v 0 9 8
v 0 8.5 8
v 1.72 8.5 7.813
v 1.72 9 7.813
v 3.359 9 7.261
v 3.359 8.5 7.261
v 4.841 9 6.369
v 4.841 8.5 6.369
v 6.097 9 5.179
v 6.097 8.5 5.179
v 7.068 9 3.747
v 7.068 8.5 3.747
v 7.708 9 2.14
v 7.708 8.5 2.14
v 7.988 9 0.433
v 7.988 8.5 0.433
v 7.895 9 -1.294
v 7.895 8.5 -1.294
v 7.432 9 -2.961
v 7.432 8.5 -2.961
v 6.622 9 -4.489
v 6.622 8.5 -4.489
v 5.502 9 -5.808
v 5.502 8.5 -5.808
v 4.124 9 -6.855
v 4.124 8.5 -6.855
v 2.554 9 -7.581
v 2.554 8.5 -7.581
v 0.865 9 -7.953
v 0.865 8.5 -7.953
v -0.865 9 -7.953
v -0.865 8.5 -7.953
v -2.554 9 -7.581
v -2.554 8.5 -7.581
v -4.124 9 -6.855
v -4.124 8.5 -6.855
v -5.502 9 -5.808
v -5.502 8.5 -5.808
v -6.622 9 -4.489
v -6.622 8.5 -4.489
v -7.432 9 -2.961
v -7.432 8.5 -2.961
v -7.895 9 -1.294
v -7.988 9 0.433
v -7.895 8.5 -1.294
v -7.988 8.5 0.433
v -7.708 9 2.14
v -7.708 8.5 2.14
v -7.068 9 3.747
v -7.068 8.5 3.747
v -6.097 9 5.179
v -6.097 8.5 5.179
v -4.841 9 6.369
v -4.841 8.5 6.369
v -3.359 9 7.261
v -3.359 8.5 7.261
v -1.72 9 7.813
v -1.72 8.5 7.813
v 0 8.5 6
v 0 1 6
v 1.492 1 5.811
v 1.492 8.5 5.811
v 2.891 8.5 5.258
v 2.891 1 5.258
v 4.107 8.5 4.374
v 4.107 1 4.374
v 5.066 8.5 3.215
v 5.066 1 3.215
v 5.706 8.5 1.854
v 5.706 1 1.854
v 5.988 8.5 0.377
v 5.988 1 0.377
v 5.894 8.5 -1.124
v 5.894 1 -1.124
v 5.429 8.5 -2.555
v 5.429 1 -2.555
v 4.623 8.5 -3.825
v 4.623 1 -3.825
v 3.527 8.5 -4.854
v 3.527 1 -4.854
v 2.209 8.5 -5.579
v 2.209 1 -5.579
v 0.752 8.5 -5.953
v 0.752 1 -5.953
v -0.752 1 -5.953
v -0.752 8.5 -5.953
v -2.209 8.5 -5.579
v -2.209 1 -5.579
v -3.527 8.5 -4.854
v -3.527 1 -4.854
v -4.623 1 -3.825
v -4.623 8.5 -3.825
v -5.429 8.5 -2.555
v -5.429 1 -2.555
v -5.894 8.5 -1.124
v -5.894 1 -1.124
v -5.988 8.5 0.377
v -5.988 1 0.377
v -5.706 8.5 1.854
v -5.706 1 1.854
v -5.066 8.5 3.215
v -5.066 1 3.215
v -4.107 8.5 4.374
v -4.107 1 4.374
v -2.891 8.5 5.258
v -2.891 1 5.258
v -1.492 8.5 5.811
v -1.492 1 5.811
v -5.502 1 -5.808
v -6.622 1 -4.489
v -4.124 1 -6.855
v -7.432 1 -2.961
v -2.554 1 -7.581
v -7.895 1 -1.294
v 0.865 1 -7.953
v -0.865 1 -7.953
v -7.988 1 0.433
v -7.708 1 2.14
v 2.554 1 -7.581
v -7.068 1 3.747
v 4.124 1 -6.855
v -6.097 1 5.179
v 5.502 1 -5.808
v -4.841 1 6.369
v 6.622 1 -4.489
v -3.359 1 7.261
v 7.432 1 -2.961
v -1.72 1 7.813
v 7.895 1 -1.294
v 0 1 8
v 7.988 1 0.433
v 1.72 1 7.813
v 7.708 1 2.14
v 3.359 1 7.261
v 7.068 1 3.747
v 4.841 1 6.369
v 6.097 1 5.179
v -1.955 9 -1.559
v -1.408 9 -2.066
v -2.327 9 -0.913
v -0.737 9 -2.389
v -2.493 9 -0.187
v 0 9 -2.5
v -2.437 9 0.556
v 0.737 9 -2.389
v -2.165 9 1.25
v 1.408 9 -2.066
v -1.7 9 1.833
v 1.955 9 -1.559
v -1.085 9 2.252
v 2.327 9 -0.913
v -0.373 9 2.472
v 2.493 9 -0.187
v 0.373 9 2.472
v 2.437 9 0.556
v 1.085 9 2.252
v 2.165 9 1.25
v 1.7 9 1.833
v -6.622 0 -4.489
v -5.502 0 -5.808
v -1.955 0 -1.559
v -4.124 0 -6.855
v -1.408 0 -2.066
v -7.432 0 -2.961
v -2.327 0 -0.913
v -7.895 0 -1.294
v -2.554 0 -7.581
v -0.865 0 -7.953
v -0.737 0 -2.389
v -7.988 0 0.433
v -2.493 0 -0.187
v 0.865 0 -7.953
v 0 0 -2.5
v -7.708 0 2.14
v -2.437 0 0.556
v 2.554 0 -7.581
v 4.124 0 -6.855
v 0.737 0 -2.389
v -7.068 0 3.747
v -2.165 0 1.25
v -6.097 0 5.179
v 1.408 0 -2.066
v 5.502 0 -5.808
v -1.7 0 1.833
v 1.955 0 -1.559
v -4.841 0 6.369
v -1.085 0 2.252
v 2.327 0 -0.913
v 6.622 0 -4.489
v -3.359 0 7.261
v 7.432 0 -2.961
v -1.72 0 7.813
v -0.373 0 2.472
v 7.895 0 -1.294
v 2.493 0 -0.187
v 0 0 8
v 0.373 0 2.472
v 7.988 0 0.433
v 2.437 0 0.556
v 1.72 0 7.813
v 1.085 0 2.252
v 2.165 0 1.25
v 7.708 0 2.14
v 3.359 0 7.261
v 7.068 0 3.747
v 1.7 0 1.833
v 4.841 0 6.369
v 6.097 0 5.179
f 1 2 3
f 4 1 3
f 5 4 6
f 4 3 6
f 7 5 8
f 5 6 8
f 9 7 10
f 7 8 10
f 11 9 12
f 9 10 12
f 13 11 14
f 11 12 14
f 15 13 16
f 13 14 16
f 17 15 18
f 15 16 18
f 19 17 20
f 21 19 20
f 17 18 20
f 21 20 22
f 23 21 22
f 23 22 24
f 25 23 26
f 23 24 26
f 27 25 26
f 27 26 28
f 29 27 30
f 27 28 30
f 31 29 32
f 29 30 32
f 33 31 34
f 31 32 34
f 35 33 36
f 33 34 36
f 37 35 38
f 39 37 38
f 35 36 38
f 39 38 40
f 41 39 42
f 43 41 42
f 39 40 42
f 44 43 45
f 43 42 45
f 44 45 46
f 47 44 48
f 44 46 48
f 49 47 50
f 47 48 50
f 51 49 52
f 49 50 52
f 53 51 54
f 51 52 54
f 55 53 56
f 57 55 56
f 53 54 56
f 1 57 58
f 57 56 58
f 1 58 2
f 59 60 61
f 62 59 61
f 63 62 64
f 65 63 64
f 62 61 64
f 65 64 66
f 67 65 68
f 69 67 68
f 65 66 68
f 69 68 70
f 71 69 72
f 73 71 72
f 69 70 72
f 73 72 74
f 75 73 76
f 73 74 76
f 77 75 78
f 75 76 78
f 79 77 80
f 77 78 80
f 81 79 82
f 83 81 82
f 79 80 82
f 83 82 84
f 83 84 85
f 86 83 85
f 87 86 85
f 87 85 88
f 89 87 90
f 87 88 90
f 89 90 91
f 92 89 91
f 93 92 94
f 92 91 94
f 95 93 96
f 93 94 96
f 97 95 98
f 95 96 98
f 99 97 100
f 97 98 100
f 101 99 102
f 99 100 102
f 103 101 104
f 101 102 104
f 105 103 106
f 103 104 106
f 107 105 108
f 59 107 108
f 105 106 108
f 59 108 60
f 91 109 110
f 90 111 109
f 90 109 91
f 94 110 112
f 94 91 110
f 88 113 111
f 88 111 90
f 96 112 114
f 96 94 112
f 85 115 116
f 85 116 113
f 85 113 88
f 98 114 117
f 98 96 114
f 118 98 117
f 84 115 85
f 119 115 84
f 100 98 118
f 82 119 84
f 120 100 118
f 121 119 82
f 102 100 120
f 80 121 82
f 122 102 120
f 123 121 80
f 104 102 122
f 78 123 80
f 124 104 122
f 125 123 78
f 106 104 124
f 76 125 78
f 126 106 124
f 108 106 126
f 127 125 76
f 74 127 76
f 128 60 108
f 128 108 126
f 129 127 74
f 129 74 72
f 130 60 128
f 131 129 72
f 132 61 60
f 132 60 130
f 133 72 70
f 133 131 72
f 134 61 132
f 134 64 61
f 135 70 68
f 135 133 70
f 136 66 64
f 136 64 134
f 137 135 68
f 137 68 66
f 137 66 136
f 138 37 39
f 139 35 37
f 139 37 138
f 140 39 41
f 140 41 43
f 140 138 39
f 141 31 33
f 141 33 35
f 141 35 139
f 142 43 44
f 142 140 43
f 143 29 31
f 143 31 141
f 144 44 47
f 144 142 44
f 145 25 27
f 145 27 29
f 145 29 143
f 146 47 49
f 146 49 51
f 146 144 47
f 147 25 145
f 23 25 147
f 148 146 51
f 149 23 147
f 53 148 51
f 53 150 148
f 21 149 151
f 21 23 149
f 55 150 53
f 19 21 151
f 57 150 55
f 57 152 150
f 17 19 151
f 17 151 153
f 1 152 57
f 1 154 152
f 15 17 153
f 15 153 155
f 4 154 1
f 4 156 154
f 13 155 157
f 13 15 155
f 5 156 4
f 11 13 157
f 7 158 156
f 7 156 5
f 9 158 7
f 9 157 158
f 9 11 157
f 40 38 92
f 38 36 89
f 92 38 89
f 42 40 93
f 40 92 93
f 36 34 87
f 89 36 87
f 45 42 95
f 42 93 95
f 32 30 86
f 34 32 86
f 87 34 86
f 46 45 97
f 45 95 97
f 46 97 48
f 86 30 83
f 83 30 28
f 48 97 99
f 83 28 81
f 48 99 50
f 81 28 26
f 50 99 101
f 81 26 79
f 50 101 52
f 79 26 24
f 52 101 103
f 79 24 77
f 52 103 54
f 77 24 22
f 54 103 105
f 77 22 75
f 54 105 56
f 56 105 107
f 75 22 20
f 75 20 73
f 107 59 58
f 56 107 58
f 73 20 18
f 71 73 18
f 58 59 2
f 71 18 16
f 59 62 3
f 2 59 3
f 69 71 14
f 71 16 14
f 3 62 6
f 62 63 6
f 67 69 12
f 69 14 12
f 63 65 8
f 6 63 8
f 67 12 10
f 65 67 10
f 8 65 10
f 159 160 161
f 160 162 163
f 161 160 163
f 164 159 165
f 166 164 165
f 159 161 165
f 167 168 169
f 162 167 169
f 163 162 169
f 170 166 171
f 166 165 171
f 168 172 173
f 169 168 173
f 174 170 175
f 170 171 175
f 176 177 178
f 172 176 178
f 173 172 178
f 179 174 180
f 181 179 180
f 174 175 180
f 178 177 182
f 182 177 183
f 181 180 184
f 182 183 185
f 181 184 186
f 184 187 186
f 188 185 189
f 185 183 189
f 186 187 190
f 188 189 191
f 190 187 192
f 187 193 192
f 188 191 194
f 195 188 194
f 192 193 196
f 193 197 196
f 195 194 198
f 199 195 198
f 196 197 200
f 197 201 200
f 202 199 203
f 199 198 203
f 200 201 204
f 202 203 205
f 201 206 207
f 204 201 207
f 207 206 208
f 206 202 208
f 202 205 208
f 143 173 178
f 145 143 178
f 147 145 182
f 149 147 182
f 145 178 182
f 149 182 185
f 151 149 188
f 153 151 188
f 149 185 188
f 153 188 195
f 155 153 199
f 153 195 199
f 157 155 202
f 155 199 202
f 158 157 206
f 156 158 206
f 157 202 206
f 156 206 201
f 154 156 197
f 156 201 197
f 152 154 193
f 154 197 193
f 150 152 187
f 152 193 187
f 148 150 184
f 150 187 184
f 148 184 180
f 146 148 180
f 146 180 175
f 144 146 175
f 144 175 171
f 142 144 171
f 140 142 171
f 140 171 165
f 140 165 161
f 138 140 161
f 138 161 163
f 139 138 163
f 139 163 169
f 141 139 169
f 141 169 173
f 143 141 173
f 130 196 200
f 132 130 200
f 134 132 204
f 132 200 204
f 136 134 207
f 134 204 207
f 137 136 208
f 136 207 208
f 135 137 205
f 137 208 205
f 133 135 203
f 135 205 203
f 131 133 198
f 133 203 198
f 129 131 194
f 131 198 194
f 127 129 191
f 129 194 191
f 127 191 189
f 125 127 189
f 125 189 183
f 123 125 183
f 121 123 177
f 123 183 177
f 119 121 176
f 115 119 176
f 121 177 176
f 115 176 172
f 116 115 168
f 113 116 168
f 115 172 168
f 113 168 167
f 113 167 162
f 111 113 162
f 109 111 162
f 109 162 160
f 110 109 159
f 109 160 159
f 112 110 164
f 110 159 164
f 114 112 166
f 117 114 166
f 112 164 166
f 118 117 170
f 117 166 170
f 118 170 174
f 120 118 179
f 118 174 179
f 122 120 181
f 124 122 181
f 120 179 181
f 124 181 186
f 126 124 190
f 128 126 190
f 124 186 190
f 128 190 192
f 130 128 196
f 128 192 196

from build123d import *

# Parameters (mm, degrees)
SKETCH_1_R          = 8
EXTRUDE_1_DEPTH     = 1
SKETCH_2_R          = 6
EXTRUDE_2_DEPTH     = 7.5
SKETCH_3_R          = 8
EXTRUDE_3_DEPTH     = 0.5
CUT_EXTRUDE_1_REACH = 16.457
SKETCH_4_R          = 2.5


with BuildPart() as part:
    # 草图1 → 凸台-拉伸1 (new body)
    with BuildSketch(Plane(origin=(0, 0, 0), x_dir=(1, 0, 0), z_dir=(0, 1, 0))):
        with Locations(Location((0, 0, 0), (0, 0, 270))):
            Circle(SKETCH_1_R)
    extrude(amount=EXTRUDE_1_DEPTH)

    # 草图2 → 凸台-拉伸2 (add)
    with BuildSketch(Plane(origin=(0, 1, 0), x_dir=(1, 0, 0), z_dir=(0, 1, 0))):
        with Locations(Location((0, 0, 0), (0, 0, 270))):
            Circle(SKETCH_2_R)
    extrude(amount=EXTRUDE_2_DEPTH)

    # 草图3 → 凸台-拉伸3 (add)
    with BuildSketch(Plane(origin=(0, 8.5, 0), x_dir=(1, 0, 0), z_dir=(0, 1, 0))):
        with Locations(Location((0, 0, 0), (0, 0, 270))):
            Circle(SKETCH_3_R)
    extrude(amount=EXTRUDE_3_DEPTH)

    # 草图4 → 切除-拉伸1 (cut, up to next)
    with BuildSketch(Plane.XZ, mode=Mode.PRIVATE) as cut_extrude_1_sk1:
        with Locations(Location((0, 0, 0), (0, 0, 270))):
            Circle(SKETCH_4_R)
    cut_extrude_1_tool1 = extrude(cut_extrude_1_sk1.sketch, amount=-CUT_EXTRUDE_1_REACH, mode=Mode.PRIVATE) & part.part
    add(cut_extrude_1_tool1.solids().sort_by_distance((0, 0, 0))[0], mode=Mode.SUBTRACT)


solid = part.part
